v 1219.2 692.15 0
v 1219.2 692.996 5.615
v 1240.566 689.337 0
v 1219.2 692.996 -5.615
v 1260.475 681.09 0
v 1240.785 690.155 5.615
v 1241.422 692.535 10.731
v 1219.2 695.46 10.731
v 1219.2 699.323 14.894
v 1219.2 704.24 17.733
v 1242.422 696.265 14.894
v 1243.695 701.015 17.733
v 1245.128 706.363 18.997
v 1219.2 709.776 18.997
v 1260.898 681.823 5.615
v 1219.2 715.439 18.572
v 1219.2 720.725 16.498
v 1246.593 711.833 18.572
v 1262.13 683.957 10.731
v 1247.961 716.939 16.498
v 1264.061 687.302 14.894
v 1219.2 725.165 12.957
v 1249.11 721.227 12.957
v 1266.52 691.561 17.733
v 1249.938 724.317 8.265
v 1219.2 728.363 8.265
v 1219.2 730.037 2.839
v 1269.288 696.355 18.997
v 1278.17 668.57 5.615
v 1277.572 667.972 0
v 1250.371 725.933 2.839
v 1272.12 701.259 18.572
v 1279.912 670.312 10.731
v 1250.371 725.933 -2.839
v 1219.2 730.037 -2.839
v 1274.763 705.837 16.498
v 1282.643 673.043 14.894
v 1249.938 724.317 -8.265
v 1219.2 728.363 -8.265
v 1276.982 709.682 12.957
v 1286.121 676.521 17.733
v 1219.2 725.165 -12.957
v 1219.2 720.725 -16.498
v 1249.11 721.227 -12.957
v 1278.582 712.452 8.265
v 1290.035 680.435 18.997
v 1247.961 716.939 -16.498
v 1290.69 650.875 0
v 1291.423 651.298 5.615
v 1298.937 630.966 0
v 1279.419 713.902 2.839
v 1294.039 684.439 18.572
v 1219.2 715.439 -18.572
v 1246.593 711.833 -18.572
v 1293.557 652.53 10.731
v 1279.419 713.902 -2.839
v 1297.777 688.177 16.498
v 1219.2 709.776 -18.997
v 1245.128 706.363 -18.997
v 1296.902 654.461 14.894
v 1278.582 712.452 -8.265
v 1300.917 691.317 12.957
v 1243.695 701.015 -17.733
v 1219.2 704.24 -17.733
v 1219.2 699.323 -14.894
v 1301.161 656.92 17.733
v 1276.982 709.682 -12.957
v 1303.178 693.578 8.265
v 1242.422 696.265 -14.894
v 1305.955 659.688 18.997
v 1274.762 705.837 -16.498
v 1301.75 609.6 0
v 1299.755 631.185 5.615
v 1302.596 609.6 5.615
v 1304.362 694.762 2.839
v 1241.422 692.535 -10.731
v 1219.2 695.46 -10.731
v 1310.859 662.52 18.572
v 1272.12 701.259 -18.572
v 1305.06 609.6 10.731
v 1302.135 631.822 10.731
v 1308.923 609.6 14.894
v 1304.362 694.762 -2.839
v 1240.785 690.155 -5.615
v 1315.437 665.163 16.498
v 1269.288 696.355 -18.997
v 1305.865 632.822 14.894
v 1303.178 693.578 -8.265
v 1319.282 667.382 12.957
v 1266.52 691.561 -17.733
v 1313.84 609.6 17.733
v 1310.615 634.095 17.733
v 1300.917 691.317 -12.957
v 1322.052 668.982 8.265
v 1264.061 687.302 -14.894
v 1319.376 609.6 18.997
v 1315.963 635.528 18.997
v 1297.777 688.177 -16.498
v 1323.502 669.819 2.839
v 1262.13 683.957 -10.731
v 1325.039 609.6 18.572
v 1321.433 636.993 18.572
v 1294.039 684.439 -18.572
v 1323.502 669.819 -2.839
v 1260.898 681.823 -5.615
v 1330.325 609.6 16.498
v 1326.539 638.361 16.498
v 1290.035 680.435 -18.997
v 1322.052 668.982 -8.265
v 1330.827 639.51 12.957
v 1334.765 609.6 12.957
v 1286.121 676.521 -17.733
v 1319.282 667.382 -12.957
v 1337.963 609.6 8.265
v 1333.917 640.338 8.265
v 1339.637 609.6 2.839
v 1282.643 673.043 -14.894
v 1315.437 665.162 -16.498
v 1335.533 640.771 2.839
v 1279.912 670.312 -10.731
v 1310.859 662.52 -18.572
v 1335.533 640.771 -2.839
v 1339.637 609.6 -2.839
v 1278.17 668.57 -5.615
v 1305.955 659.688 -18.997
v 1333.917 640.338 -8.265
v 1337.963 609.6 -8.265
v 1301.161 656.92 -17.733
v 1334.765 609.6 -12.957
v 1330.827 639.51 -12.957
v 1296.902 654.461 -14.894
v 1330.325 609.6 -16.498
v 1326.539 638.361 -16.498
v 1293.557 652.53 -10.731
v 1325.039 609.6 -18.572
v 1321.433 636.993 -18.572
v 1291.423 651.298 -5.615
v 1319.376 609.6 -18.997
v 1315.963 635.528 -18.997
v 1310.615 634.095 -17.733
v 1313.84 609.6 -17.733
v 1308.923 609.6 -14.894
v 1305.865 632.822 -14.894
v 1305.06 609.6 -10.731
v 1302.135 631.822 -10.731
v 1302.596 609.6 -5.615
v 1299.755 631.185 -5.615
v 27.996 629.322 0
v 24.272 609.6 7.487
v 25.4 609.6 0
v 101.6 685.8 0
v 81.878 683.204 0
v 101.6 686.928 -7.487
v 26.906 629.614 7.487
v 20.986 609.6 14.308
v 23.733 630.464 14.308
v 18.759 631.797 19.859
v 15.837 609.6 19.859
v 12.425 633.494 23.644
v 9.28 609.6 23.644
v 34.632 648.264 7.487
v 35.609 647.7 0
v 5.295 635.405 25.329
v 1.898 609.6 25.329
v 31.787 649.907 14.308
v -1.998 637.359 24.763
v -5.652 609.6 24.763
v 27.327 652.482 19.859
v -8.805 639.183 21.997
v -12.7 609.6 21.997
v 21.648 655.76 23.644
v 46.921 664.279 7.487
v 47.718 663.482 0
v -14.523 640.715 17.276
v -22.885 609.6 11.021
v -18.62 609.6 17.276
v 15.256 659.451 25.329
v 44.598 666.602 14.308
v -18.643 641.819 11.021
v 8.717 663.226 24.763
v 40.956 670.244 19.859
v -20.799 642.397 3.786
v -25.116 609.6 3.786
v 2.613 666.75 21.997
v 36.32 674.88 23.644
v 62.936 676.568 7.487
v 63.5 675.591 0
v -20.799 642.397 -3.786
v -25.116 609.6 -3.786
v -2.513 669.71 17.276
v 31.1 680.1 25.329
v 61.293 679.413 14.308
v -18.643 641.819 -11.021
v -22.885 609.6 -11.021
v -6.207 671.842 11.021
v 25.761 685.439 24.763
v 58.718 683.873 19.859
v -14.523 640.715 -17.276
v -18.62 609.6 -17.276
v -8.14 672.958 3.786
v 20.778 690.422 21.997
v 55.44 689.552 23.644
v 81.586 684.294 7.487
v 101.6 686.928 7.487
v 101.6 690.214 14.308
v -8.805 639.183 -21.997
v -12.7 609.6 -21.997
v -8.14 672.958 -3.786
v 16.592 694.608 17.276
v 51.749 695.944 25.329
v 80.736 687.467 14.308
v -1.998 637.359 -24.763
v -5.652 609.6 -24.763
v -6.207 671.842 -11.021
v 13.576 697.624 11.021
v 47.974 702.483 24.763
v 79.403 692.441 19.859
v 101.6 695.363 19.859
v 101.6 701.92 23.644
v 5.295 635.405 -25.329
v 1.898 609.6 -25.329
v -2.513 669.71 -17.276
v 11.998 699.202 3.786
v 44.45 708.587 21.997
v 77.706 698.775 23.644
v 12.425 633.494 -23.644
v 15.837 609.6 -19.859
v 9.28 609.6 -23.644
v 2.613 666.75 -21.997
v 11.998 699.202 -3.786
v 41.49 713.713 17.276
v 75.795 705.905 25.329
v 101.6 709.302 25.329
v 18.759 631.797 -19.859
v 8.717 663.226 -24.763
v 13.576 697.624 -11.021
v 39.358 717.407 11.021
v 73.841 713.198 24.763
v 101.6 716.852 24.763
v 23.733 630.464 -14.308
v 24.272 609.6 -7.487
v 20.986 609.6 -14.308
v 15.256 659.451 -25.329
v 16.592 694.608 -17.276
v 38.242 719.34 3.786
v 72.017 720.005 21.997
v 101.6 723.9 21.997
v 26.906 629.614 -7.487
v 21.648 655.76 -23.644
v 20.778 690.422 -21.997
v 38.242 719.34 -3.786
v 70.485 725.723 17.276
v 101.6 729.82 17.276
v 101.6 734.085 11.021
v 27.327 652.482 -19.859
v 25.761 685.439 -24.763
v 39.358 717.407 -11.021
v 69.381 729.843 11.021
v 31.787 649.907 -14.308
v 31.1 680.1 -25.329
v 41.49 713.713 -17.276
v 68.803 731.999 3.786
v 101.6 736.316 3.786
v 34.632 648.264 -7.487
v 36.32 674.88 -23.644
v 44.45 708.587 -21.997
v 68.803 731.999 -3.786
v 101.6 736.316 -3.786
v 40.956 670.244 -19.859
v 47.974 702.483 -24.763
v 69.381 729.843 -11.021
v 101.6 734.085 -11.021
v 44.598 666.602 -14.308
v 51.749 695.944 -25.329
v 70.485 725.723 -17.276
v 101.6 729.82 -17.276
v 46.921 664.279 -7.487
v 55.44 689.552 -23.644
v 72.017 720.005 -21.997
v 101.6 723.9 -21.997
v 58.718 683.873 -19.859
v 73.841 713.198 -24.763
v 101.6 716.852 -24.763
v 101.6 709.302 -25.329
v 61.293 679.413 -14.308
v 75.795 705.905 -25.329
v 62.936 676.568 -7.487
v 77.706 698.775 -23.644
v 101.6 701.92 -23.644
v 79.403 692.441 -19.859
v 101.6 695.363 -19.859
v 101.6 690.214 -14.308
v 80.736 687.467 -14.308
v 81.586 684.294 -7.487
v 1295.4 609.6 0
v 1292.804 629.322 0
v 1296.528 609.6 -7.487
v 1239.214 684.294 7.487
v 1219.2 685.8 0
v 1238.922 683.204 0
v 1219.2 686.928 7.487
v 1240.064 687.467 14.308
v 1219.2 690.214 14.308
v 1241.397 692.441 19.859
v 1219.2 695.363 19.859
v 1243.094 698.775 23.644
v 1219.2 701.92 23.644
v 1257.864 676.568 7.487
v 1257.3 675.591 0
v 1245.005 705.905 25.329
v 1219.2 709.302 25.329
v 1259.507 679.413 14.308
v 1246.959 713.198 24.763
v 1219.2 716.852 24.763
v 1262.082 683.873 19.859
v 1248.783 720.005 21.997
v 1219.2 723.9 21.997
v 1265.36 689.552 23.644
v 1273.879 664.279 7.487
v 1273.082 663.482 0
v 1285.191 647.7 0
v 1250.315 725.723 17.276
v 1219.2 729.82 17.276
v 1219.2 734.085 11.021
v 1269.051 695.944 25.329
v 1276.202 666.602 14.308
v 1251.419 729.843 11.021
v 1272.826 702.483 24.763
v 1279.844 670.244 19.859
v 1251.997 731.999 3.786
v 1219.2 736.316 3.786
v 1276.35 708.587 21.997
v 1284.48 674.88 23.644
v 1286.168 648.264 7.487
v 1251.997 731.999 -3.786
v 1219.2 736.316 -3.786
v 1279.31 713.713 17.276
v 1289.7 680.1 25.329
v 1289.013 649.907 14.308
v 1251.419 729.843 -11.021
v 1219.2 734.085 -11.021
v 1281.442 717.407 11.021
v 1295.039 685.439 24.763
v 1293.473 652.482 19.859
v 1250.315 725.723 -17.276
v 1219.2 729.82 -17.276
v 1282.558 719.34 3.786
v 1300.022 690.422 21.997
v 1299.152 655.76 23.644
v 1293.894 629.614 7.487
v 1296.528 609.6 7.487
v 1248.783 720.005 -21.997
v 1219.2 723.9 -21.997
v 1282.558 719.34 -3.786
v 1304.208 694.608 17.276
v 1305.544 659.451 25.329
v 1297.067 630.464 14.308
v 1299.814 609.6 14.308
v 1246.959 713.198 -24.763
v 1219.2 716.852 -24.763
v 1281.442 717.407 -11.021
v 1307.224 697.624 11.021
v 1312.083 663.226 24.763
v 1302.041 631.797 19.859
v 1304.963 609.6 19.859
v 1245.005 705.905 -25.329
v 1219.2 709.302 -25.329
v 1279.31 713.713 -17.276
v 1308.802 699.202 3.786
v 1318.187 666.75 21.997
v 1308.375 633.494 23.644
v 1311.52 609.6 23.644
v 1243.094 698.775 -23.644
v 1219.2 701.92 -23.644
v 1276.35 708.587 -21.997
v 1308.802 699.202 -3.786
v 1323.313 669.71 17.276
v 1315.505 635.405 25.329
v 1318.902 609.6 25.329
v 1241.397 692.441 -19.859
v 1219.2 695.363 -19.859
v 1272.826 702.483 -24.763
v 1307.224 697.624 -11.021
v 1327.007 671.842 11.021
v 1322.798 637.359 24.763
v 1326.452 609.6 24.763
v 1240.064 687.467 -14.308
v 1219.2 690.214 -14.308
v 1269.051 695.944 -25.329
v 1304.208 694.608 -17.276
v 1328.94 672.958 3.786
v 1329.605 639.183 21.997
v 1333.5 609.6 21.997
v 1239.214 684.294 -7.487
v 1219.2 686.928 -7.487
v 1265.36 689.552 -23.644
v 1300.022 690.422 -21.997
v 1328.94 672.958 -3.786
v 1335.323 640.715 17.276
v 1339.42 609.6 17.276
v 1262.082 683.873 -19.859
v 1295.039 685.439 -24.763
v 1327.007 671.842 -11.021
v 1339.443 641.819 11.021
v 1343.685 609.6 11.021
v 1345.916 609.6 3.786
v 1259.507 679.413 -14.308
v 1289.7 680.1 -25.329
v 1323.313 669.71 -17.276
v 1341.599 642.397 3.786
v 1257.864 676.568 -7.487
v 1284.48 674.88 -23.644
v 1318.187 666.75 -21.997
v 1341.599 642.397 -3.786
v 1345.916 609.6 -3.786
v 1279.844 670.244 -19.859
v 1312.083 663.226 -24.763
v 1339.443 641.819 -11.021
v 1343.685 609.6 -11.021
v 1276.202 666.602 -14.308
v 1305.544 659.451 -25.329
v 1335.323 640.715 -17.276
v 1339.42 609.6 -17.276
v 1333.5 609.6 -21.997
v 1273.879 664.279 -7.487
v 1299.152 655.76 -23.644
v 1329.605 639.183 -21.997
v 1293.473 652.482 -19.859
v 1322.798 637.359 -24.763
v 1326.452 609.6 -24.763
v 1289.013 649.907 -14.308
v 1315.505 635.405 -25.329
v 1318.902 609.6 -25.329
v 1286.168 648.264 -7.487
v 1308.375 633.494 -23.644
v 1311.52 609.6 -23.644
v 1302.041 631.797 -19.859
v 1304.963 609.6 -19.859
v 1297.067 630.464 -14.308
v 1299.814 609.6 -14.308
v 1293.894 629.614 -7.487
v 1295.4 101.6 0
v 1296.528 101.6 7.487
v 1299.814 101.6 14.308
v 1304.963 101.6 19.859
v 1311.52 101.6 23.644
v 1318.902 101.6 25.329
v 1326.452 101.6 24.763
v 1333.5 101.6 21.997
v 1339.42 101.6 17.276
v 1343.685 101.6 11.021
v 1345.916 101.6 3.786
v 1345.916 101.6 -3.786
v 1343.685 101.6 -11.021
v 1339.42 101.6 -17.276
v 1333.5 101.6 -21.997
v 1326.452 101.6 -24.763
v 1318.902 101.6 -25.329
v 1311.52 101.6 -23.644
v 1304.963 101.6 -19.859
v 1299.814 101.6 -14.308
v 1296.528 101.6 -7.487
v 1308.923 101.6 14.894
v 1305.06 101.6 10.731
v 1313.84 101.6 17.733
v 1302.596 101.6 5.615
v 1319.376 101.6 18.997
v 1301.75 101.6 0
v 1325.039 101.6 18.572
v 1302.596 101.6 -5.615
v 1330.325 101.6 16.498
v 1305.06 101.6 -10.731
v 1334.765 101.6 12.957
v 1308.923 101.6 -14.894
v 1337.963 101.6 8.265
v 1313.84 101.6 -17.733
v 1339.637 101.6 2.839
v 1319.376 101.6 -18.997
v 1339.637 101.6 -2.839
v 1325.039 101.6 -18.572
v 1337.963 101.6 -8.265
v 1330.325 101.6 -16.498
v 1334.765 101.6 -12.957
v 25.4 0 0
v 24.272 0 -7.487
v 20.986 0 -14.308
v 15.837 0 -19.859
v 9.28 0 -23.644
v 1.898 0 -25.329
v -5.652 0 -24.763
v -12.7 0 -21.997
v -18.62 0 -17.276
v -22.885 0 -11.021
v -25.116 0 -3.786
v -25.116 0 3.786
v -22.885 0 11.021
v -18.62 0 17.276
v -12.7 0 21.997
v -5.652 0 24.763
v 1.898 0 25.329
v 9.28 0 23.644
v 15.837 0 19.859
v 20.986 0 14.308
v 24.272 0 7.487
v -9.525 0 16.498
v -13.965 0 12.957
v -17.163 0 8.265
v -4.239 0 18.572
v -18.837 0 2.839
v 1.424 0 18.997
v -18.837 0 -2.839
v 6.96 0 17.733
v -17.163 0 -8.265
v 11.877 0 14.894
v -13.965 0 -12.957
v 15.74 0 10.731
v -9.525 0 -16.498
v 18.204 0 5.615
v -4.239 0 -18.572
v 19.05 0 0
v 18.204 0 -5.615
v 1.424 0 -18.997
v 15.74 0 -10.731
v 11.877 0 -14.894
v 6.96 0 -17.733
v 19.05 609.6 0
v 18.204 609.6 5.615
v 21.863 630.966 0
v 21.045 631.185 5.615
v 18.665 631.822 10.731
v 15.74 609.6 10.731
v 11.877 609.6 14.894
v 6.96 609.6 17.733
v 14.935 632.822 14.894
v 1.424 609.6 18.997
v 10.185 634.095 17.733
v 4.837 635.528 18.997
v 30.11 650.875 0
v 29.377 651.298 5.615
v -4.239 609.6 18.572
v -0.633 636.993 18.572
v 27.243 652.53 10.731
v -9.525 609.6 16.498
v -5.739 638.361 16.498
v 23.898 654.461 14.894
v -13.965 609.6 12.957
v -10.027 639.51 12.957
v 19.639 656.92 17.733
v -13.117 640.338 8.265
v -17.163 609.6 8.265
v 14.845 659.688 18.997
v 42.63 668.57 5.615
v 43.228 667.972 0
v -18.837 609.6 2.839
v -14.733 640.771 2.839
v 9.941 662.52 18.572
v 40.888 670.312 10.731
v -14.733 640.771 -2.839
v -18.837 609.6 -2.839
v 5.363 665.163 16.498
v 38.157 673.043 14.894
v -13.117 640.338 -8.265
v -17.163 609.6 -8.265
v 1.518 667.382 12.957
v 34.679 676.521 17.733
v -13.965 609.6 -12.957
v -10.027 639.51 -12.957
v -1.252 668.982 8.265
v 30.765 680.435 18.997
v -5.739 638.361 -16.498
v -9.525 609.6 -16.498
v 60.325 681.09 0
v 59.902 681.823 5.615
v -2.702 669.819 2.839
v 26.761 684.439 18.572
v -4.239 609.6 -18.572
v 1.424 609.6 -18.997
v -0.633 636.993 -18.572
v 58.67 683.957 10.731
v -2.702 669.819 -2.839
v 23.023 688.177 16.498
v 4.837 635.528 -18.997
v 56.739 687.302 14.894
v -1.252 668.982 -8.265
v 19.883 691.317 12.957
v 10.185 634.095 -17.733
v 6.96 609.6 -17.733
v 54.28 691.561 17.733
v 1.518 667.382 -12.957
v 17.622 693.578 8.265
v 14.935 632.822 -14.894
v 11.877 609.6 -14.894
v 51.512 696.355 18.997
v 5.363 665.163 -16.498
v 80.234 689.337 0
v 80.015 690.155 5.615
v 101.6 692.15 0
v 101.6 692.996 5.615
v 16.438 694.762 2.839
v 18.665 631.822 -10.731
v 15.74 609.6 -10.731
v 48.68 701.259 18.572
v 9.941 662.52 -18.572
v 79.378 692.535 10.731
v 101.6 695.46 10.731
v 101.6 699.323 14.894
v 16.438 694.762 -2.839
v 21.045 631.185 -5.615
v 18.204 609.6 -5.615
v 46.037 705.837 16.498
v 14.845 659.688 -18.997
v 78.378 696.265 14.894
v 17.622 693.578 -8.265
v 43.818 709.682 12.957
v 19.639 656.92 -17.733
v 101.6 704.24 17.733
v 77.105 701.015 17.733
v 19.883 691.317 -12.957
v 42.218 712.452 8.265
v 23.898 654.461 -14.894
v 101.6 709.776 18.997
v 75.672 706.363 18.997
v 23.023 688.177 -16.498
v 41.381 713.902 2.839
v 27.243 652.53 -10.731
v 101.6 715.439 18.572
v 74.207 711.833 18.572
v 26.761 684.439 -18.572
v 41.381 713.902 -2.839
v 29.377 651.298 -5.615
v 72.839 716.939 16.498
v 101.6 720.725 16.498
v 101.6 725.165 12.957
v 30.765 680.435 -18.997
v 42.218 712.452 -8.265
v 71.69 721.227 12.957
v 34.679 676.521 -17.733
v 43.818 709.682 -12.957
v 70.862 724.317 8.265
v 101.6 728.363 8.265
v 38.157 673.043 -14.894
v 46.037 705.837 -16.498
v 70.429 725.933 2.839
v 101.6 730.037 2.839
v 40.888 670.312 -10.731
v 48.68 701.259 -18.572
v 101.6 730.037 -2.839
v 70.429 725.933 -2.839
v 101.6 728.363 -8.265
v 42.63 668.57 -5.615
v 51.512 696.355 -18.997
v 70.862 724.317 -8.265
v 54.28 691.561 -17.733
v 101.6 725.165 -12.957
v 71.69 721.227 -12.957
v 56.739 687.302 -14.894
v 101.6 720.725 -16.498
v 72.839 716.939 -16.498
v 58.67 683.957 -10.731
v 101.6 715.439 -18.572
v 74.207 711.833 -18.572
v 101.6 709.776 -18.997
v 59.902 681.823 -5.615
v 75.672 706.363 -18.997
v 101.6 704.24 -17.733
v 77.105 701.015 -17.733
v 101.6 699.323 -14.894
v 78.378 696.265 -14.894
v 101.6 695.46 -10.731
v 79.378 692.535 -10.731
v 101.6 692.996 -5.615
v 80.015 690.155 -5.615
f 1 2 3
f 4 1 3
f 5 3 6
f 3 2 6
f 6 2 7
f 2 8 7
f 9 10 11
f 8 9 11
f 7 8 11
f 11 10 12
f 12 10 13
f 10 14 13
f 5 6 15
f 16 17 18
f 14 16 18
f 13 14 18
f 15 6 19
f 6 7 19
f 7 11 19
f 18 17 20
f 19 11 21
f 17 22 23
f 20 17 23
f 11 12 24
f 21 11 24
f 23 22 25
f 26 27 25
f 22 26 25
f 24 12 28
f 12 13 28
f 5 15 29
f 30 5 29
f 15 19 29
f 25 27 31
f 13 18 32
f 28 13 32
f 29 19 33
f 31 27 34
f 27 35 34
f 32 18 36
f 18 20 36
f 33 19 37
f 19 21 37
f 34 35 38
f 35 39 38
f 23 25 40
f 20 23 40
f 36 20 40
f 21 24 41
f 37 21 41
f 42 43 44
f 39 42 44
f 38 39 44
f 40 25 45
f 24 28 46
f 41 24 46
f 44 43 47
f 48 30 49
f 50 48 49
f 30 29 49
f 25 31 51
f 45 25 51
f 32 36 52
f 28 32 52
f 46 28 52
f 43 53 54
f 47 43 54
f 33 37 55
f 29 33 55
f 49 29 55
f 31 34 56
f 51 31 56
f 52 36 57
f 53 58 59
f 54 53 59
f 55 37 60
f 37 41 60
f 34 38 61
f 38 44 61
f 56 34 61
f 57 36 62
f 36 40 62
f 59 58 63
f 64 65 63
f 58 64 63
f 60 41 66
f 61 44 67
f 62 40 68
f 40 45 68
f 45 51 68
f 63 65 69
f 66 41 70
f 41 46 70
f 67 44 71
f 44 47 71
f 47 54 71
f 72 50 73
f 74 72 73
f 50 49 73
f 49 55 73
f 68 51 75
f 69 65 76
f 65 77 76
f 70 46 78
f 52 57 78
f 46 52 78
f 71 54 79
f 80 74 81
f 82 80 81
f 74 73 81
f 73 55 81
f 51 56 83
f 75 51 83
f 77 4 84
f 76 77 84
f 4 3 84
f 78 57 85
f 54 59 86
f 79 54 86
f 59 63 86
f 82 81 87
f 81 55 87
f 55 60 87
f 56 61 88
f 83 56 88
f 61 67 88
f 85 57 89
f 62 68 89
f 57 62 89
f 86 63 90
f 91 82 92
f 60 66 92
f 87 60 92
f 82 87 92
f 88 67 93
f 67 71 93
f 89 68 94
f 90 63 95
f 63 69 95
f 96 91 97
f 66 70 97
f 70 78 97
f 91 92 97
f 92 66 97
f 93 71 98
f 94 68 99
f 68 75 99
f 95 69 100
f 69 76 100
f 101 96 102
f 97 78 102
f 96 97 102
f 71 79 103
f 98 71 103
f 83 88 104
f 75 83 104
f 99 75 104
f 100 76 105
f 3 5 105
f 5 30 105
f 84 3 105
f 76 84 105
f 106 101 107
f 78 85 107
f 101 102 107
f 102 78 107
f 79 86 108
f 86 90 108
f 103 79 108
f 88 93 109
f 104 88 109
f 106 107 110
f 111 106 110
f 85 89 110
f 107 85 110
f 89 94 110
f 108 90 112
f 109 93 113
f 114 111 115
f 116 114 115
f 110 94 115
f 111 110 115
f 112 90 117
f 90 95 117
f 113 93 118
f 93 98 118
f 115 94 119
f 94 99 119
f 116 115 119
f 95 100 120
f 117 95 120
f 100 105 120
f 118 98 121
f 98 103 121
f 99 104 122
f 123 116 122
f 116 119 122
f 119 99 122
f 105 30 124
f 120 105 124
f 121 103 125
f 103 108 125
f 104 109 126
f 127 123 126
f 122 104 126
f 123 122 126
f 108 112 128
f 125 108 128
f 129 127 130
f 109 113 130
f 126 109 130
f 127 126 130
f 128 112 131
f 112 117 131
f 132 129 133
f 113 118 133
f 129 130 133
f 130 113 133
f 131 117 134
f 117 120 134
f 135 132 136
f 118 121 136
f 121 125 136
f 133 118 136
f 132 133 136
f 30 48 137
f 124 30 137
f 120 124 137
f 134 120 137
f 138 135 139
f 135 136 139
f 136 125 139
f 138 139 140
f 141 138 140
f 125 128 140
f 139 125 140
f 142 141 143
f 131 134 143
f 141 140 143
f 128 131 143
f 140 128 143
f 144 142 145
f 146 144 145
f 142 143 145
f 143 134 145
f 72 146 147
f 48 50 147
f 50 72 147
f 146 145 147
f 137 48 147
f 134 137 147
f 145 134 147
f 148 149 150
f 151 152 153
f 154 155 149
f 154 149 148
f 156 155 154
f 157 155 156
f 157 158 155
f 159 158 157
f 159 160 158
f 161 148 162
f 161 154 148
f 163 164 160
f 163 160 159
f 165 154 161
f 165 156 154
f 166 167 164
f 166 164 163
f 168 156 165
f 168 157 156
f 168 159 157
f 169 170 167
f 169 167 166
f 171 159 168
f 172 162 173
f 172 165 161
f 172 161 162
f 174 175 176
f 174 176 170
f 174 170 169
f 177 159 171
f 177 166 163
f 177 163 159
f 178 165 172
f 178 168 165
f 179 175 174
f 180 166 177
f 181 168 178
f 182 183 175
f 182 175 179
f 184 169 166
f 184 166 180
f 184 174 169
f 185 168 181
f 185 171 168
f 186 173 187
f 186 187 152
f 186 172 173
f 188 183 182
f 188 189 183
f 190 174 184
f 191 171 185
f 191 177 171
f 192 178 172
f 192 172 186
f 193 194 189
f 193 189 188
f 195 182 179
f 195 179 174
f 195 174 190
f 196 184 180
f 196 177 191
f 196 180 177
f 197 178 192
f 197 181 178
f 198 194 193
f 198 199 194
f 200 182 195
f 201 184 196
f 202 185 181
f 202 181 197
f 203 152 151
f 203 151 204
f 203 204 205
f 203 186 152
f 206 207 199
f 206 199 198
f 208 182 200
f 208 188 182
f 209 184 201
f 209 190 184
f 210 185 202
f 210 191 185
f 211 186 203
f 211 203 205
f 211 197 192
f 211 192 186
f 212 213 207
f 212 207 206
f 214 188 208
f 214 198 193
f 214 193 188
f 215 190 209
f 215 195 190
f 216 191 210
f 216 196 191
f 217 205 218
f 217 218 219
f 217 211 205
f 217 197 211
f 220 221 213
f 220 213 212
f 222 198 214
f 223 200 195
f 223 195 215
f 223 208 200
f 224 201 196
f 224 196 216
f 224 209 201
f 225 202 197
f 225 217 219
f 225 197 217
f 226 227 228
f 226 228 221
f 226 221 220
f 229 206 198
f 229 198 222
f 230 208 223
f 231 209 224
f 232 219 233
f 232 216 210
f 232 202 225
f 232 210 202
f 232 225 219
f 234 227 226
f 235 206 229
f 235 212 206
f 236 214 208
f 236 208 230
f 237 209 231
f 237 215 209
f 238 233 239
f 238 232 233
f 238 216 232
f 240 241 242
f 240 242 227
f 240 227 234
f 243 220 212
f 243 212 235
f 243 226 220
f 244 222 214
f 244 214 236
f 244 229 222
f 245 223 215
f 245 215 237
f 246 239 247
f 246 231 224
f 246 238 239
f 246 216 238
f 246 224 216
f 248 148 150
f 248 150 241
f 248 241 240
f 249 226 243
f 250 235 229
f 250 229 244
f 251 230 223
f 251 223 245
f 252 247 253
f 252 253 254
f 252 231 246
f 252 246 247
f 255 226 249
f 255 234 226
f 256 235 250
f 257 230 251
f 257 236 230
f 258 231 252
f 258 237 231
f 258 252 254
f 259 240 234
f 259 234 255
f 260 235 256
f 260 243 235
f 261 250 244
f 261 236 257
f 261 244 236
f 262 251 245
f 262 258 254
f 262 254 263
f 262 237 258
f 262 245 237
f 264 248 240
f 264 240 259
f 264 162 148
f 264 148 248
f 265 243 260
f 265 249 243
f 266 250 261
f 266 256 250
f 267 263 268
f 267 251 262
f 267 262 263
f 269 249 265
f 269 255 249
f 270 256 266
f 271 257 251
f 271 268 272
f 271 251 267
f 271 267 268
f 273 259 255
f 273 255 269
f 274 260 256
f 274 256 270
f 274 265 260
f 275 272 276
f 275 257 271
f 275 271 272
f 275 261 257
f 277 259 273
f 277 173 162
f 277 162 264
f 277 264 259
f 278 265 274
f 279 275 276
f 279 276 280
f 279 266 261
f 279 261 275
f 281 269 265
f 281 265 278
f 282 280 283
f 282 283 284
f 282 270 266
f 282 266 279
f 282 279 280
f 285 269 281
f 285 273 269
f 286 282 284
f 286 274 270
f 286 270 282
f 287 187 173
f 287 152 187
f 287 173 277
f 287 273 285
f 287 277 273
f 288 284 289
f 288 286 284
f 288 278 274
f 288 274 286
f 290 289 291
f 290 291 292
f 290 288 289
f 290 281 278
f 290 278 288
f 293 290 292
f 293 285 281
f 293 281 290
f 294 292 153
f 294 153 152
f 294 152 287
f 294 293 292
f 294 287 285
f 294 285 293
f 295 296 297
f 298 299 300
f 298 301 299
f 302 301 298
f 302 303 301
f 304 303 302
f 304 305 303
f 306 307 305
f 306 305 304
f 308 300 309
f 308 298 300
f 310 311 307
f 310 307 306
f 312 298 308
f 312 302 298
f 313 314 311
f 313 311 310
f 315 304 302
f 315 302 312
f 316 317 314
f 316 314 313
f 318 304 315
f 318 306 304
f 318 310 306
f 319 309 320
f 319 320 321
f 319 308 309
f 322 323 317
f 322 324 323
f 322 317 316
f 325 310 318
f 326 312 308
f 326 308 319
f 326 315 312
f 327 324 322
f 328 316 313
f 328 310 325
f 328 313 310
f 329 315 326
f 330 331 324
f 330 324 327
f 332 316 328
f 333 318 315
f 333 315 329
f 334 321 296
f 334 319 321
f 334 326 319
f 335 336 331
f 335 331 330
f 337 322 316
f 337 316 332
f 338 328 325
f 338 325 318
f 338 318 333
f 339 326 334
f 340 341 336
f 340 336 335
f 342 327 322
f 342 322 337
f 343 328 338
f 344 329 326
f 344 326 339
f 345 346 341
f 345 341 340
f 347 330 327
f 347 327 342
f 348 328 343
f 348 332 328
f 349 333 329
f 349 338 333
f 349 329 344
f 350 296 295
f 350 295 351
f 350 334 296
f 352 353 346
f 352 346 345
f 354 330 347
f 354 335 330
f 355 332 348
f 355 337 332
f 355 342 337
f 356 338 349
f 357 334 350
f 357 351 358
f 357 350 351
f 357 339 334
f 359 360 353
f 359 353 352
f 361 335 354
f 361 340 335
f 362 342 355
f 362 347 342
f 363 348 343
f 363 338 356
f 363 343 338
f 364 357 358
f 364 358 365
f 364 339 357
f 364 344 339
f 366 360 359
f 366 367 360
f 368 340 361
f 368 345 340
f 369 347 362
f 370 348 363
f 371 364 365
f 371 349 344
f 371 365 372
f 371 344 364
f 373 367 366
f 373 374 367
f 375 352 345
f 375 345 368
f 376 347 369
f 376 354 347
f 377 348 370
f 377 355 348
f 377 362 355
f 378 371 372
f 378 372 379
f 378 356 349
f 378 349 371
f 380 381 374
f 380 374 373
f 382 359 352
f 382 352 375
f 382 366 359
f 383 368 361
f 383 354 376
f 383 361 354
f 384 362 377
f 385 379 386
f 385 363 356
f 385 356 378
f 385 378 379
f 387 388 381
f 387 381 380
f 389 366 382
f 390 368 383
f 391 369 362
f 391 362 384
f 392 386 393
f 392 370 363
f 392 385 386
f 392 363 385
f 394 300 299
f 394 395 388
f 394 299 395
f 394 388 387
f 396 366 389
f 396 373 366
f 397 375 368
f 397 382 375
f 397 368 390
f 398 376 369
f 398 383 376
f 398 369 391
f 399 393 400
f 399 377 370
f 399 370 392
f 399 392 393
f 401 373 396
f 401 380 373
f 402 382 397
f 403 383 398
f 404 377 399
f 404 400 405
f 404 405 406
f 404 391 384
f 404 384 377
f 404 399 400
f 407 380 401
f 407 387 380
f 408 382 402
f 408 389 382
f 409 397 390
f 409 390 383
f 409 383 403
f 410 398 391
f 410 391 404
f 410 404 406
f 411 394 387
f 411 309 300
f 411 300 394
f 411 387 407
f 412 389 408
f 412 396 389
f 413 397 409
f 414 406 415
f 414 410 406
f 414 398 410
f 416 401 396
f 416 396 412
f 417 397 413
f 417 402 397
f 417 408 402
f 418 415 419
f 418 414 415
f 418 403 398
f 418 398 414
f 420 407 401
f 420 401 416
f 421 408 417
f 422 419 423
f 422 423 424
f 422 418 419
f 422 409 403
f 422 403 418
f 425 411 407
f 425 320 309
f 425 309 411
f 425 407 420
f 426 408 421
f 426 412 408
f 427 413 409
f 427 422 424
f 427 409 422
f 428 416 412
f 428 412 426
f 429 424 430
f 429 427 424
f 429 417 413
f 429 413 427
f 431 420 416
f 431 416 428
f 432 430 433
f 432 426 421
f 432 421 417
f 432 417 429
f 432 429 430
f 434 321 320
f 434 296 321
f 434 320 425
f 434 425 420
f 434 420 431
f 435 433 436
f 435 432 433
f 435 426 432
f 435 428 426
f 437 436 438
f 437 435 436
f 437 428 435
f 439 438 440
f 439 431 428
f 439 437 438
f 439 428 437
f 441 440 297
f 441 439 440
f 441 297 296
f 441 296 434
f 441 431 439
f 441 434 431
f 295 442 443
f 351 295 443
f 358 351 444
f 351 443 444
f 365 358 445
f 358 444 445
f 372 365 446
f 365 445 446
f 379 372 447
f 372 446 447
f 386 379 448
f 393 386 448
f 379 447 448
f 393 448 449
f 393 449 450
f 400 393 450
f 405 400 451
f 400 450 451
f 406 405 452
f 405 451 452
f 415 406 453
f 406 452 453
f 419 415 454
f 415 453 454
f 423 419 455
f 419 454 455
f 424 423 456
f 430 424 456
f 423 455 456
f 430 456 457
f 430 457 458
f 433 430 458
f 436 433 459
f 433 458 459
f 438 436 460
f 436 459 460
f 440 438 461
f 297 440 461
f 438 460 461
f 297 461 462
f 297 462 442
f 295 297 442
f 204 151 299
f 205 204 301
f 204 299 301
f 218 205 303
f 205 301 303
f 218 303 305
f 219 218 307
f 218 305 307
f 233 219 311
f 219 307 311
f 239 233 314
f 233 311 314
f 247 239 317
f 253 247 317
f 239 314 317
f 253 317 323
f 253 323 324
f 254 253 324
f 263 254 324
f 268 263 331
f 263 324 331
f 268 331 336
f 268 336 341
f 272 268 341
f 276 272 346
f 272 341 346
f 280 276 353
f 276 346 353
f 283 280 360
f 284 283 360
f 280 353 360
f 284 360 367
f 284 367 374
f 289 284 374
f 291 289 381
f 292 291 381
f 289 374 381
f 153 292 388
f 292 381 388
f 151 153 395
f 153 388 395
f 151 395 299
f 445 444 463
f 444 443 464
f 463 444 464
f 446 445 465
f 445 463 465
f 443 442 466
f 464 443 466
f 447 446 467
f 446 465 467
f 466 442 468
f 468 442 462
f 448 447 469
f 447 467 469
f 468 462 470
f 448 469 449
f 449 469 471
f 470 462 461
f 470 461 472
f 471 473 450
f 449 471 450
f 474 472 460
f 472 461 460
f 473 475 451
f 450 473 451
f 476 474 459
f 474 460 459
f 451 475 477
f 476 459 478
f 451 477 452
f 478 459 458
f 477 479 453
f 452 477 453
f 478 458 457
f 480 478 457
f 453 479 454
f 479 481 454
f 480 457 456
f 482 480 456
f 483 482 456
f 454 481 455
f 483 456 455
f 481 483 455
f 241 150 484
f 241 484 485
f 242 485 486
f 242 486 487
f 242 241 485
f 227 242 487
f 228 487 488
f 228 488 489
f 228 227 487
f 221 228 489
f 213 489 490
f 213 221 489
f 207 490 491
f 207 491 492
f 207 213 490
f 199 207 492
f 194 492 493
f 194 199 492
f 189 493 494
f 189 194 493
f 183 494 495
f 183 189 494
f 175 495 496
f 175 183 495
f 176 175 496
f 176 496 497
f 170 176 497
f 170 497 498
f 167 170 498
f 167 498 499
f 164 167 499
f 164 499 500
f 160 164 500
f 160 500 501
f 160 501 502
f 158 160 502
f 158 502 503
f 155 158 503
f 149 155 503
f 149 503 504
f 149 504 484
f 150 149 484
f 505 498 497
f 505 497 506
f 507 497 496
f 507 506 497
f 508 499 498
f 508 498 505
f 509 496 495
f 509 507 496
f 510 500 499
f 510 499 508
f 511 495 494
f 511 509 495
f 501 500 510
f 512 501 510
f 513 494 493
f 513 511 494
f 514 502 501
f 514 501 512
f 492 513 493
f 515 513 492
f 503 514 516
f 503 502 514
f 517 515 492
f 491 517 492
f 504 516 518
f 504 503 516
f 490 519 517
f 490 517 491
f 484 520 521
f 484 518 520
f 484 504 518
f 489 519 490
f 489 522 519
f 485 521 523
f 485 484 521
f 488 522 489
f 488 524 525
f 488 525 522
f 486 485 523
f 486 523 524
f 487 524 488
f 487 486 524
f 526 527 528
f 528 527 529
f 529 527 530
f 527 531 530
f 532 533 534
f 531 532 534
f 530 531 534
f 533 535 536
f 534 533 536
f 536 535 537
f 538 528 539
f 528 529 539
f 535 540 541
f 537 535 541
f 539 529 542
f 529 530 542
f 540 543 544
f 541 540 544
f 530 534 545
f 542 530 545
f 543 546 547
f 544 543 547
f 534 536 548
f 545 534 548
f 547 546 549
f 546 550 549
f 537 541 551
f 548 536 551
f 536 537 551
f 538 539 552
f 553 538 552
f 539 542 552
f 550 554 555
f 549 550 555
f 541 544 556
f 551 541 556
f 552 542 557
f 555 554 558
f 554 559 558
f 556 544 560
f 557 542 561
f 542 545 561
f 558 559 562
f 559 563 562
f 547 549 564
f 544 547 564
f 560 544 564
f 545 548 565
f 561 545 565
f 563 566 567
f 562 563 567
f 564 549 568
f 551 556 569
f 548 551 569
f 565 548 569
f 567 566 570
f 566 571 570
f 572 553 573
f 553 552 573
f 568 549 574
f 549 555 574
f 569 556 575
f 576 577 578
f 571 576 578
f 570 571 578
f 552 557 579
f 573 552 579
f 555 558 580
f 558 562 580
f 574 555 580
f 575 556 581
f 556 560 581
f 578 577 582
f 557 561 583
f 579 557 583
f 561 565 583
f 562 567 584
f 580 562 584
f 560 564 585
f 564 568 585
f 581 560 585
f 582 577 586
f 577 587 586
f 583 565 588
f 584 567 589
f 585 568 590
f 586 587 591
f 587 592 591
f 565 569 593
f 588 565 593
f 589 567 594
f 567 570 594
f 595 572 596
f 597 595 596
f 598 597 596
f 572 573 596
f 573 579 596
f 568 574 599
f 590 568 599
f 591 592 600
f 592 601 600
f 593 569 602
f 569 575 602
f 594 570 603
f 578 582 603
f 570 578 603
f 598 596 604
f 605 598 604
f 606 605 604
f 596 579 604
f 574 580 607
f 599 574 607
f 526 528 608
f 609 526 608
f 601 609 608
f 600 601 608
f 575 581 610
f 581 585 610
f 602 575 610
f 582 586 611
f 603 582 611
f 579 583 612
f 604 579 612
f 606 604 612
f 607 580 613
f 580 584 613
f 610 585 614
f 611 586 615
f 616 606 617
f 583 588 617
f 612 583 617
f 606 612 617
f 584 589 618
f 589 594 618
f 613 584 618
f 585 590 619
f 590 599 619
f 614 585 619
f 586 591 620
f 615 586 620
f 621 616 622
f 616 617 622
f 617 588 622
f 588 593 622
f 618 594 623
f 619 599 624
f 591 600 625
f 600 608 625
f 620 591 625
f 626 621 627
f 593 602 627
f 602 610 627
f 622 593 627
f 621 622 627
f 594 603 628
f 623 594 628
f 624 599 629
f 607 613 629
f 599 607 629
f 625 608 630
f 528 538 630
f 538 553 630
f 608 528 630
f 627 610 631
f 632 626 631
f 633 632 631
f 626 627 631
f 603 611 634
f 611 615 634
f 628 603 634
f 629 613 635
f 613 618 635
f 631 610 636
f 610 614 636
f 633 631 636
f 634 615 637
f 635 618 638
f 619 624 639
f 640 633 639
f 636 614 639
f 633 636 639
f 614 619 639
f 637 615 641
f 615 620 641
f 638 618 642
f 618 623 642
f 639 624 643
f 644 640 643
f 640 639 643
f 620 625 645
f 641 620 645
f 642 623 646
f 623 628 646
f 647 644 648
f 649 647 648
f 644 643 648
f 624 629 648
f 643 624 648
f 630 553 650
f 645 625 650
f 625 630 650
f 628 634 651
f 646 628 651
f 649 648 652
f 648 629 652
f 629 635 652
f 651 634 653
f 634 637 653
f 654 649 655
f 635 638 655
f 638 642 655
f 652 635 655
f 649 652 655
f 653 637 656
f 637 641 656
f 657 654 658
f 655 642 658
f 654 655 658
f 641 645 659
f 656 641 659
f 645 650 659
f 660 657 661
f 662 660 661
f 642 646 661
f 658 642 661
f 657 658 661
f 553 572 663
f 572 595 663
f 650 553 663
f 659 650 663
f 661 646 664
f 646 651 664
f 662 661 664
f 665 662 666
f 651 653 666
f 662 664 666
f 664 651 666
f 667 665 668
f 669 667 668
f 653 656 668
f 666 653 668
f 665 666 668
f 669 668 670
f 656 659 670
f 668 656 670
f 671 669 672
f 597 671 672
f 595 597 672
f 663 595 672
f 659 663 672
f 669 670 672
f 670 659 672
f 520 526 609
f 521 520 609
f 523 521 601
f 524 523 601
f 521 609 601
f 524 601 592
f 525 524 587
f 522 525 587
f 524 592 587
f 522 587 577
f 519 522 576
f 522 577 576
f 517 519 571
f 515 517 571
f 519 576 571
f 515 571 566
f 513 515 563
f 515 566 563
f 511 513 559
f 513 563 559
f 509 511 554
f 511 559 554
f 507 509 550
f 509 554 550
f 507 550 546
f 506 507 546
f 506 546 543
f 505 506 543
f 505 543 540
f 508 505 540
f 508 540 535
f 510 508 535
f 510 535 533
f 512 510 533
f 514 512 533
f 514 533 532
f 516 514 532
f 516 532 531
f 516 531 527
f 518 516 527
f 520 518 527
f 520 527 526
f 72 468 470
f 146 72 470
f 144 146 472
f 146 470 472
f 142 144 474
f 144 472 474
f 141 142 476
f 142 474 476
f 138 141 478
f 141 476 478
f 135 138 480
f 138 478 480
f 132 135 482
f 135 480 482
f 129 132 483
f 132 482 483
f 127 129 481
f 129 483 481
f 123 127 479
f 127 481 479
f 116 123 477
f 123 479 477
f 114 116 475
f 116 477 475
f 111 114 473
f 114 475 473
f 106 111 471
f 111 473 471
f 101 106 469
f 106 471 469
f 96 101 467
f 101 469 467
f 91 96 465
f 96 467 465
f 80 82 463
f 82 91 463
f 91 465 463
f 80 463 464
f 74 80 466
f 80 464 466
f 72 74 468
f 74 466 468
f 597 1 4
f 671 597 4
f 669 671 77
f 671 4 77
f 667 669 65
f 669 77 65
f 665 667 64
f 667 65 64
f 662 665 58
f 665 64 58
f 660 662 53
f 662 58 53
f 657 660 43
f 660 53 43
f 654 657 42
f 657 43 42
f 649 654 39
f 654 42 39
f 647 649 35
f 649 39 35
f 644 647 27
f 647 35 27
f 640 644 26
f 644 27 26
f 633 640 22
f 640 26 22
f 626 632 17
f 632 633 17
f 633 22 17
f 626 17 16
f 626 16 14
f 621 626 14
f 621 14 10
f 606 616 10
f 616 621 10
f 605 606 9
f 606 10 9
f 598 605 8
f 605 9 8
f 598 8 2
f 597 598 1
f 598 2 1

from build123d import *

# Parameters (mm, degrees)
F0_R   = 25.4
F0_R_2 = 19.05


with BuildPart() as f2:
    # F2: sweep along a path in F1
    with BuildLine(Plane.XY) as f2_path:
        Line((0, 0), (0, 609.6))
        ThreePointArc((0, 609.6), (29.757951, 681.442049), (101.6, 711.2))
        Line((101.6, 711.2), (1219.2, 711.2))
        ThreePointArc((1219.2, 711.2), (1291.042049, 681.442049), (1320.8, 609.6))
        Line((1320.8, 609.6), (1320.8, 101.6))
    # F0 (on Front) → F2 (sweep)
    with BuildSketch(Plane.XZ):
        Circle(F0_R)
        Circle(F0_R_2, mode=Mode.SUBTRACT)
    sweep(path=f2_path.line)


solid = f2.part
